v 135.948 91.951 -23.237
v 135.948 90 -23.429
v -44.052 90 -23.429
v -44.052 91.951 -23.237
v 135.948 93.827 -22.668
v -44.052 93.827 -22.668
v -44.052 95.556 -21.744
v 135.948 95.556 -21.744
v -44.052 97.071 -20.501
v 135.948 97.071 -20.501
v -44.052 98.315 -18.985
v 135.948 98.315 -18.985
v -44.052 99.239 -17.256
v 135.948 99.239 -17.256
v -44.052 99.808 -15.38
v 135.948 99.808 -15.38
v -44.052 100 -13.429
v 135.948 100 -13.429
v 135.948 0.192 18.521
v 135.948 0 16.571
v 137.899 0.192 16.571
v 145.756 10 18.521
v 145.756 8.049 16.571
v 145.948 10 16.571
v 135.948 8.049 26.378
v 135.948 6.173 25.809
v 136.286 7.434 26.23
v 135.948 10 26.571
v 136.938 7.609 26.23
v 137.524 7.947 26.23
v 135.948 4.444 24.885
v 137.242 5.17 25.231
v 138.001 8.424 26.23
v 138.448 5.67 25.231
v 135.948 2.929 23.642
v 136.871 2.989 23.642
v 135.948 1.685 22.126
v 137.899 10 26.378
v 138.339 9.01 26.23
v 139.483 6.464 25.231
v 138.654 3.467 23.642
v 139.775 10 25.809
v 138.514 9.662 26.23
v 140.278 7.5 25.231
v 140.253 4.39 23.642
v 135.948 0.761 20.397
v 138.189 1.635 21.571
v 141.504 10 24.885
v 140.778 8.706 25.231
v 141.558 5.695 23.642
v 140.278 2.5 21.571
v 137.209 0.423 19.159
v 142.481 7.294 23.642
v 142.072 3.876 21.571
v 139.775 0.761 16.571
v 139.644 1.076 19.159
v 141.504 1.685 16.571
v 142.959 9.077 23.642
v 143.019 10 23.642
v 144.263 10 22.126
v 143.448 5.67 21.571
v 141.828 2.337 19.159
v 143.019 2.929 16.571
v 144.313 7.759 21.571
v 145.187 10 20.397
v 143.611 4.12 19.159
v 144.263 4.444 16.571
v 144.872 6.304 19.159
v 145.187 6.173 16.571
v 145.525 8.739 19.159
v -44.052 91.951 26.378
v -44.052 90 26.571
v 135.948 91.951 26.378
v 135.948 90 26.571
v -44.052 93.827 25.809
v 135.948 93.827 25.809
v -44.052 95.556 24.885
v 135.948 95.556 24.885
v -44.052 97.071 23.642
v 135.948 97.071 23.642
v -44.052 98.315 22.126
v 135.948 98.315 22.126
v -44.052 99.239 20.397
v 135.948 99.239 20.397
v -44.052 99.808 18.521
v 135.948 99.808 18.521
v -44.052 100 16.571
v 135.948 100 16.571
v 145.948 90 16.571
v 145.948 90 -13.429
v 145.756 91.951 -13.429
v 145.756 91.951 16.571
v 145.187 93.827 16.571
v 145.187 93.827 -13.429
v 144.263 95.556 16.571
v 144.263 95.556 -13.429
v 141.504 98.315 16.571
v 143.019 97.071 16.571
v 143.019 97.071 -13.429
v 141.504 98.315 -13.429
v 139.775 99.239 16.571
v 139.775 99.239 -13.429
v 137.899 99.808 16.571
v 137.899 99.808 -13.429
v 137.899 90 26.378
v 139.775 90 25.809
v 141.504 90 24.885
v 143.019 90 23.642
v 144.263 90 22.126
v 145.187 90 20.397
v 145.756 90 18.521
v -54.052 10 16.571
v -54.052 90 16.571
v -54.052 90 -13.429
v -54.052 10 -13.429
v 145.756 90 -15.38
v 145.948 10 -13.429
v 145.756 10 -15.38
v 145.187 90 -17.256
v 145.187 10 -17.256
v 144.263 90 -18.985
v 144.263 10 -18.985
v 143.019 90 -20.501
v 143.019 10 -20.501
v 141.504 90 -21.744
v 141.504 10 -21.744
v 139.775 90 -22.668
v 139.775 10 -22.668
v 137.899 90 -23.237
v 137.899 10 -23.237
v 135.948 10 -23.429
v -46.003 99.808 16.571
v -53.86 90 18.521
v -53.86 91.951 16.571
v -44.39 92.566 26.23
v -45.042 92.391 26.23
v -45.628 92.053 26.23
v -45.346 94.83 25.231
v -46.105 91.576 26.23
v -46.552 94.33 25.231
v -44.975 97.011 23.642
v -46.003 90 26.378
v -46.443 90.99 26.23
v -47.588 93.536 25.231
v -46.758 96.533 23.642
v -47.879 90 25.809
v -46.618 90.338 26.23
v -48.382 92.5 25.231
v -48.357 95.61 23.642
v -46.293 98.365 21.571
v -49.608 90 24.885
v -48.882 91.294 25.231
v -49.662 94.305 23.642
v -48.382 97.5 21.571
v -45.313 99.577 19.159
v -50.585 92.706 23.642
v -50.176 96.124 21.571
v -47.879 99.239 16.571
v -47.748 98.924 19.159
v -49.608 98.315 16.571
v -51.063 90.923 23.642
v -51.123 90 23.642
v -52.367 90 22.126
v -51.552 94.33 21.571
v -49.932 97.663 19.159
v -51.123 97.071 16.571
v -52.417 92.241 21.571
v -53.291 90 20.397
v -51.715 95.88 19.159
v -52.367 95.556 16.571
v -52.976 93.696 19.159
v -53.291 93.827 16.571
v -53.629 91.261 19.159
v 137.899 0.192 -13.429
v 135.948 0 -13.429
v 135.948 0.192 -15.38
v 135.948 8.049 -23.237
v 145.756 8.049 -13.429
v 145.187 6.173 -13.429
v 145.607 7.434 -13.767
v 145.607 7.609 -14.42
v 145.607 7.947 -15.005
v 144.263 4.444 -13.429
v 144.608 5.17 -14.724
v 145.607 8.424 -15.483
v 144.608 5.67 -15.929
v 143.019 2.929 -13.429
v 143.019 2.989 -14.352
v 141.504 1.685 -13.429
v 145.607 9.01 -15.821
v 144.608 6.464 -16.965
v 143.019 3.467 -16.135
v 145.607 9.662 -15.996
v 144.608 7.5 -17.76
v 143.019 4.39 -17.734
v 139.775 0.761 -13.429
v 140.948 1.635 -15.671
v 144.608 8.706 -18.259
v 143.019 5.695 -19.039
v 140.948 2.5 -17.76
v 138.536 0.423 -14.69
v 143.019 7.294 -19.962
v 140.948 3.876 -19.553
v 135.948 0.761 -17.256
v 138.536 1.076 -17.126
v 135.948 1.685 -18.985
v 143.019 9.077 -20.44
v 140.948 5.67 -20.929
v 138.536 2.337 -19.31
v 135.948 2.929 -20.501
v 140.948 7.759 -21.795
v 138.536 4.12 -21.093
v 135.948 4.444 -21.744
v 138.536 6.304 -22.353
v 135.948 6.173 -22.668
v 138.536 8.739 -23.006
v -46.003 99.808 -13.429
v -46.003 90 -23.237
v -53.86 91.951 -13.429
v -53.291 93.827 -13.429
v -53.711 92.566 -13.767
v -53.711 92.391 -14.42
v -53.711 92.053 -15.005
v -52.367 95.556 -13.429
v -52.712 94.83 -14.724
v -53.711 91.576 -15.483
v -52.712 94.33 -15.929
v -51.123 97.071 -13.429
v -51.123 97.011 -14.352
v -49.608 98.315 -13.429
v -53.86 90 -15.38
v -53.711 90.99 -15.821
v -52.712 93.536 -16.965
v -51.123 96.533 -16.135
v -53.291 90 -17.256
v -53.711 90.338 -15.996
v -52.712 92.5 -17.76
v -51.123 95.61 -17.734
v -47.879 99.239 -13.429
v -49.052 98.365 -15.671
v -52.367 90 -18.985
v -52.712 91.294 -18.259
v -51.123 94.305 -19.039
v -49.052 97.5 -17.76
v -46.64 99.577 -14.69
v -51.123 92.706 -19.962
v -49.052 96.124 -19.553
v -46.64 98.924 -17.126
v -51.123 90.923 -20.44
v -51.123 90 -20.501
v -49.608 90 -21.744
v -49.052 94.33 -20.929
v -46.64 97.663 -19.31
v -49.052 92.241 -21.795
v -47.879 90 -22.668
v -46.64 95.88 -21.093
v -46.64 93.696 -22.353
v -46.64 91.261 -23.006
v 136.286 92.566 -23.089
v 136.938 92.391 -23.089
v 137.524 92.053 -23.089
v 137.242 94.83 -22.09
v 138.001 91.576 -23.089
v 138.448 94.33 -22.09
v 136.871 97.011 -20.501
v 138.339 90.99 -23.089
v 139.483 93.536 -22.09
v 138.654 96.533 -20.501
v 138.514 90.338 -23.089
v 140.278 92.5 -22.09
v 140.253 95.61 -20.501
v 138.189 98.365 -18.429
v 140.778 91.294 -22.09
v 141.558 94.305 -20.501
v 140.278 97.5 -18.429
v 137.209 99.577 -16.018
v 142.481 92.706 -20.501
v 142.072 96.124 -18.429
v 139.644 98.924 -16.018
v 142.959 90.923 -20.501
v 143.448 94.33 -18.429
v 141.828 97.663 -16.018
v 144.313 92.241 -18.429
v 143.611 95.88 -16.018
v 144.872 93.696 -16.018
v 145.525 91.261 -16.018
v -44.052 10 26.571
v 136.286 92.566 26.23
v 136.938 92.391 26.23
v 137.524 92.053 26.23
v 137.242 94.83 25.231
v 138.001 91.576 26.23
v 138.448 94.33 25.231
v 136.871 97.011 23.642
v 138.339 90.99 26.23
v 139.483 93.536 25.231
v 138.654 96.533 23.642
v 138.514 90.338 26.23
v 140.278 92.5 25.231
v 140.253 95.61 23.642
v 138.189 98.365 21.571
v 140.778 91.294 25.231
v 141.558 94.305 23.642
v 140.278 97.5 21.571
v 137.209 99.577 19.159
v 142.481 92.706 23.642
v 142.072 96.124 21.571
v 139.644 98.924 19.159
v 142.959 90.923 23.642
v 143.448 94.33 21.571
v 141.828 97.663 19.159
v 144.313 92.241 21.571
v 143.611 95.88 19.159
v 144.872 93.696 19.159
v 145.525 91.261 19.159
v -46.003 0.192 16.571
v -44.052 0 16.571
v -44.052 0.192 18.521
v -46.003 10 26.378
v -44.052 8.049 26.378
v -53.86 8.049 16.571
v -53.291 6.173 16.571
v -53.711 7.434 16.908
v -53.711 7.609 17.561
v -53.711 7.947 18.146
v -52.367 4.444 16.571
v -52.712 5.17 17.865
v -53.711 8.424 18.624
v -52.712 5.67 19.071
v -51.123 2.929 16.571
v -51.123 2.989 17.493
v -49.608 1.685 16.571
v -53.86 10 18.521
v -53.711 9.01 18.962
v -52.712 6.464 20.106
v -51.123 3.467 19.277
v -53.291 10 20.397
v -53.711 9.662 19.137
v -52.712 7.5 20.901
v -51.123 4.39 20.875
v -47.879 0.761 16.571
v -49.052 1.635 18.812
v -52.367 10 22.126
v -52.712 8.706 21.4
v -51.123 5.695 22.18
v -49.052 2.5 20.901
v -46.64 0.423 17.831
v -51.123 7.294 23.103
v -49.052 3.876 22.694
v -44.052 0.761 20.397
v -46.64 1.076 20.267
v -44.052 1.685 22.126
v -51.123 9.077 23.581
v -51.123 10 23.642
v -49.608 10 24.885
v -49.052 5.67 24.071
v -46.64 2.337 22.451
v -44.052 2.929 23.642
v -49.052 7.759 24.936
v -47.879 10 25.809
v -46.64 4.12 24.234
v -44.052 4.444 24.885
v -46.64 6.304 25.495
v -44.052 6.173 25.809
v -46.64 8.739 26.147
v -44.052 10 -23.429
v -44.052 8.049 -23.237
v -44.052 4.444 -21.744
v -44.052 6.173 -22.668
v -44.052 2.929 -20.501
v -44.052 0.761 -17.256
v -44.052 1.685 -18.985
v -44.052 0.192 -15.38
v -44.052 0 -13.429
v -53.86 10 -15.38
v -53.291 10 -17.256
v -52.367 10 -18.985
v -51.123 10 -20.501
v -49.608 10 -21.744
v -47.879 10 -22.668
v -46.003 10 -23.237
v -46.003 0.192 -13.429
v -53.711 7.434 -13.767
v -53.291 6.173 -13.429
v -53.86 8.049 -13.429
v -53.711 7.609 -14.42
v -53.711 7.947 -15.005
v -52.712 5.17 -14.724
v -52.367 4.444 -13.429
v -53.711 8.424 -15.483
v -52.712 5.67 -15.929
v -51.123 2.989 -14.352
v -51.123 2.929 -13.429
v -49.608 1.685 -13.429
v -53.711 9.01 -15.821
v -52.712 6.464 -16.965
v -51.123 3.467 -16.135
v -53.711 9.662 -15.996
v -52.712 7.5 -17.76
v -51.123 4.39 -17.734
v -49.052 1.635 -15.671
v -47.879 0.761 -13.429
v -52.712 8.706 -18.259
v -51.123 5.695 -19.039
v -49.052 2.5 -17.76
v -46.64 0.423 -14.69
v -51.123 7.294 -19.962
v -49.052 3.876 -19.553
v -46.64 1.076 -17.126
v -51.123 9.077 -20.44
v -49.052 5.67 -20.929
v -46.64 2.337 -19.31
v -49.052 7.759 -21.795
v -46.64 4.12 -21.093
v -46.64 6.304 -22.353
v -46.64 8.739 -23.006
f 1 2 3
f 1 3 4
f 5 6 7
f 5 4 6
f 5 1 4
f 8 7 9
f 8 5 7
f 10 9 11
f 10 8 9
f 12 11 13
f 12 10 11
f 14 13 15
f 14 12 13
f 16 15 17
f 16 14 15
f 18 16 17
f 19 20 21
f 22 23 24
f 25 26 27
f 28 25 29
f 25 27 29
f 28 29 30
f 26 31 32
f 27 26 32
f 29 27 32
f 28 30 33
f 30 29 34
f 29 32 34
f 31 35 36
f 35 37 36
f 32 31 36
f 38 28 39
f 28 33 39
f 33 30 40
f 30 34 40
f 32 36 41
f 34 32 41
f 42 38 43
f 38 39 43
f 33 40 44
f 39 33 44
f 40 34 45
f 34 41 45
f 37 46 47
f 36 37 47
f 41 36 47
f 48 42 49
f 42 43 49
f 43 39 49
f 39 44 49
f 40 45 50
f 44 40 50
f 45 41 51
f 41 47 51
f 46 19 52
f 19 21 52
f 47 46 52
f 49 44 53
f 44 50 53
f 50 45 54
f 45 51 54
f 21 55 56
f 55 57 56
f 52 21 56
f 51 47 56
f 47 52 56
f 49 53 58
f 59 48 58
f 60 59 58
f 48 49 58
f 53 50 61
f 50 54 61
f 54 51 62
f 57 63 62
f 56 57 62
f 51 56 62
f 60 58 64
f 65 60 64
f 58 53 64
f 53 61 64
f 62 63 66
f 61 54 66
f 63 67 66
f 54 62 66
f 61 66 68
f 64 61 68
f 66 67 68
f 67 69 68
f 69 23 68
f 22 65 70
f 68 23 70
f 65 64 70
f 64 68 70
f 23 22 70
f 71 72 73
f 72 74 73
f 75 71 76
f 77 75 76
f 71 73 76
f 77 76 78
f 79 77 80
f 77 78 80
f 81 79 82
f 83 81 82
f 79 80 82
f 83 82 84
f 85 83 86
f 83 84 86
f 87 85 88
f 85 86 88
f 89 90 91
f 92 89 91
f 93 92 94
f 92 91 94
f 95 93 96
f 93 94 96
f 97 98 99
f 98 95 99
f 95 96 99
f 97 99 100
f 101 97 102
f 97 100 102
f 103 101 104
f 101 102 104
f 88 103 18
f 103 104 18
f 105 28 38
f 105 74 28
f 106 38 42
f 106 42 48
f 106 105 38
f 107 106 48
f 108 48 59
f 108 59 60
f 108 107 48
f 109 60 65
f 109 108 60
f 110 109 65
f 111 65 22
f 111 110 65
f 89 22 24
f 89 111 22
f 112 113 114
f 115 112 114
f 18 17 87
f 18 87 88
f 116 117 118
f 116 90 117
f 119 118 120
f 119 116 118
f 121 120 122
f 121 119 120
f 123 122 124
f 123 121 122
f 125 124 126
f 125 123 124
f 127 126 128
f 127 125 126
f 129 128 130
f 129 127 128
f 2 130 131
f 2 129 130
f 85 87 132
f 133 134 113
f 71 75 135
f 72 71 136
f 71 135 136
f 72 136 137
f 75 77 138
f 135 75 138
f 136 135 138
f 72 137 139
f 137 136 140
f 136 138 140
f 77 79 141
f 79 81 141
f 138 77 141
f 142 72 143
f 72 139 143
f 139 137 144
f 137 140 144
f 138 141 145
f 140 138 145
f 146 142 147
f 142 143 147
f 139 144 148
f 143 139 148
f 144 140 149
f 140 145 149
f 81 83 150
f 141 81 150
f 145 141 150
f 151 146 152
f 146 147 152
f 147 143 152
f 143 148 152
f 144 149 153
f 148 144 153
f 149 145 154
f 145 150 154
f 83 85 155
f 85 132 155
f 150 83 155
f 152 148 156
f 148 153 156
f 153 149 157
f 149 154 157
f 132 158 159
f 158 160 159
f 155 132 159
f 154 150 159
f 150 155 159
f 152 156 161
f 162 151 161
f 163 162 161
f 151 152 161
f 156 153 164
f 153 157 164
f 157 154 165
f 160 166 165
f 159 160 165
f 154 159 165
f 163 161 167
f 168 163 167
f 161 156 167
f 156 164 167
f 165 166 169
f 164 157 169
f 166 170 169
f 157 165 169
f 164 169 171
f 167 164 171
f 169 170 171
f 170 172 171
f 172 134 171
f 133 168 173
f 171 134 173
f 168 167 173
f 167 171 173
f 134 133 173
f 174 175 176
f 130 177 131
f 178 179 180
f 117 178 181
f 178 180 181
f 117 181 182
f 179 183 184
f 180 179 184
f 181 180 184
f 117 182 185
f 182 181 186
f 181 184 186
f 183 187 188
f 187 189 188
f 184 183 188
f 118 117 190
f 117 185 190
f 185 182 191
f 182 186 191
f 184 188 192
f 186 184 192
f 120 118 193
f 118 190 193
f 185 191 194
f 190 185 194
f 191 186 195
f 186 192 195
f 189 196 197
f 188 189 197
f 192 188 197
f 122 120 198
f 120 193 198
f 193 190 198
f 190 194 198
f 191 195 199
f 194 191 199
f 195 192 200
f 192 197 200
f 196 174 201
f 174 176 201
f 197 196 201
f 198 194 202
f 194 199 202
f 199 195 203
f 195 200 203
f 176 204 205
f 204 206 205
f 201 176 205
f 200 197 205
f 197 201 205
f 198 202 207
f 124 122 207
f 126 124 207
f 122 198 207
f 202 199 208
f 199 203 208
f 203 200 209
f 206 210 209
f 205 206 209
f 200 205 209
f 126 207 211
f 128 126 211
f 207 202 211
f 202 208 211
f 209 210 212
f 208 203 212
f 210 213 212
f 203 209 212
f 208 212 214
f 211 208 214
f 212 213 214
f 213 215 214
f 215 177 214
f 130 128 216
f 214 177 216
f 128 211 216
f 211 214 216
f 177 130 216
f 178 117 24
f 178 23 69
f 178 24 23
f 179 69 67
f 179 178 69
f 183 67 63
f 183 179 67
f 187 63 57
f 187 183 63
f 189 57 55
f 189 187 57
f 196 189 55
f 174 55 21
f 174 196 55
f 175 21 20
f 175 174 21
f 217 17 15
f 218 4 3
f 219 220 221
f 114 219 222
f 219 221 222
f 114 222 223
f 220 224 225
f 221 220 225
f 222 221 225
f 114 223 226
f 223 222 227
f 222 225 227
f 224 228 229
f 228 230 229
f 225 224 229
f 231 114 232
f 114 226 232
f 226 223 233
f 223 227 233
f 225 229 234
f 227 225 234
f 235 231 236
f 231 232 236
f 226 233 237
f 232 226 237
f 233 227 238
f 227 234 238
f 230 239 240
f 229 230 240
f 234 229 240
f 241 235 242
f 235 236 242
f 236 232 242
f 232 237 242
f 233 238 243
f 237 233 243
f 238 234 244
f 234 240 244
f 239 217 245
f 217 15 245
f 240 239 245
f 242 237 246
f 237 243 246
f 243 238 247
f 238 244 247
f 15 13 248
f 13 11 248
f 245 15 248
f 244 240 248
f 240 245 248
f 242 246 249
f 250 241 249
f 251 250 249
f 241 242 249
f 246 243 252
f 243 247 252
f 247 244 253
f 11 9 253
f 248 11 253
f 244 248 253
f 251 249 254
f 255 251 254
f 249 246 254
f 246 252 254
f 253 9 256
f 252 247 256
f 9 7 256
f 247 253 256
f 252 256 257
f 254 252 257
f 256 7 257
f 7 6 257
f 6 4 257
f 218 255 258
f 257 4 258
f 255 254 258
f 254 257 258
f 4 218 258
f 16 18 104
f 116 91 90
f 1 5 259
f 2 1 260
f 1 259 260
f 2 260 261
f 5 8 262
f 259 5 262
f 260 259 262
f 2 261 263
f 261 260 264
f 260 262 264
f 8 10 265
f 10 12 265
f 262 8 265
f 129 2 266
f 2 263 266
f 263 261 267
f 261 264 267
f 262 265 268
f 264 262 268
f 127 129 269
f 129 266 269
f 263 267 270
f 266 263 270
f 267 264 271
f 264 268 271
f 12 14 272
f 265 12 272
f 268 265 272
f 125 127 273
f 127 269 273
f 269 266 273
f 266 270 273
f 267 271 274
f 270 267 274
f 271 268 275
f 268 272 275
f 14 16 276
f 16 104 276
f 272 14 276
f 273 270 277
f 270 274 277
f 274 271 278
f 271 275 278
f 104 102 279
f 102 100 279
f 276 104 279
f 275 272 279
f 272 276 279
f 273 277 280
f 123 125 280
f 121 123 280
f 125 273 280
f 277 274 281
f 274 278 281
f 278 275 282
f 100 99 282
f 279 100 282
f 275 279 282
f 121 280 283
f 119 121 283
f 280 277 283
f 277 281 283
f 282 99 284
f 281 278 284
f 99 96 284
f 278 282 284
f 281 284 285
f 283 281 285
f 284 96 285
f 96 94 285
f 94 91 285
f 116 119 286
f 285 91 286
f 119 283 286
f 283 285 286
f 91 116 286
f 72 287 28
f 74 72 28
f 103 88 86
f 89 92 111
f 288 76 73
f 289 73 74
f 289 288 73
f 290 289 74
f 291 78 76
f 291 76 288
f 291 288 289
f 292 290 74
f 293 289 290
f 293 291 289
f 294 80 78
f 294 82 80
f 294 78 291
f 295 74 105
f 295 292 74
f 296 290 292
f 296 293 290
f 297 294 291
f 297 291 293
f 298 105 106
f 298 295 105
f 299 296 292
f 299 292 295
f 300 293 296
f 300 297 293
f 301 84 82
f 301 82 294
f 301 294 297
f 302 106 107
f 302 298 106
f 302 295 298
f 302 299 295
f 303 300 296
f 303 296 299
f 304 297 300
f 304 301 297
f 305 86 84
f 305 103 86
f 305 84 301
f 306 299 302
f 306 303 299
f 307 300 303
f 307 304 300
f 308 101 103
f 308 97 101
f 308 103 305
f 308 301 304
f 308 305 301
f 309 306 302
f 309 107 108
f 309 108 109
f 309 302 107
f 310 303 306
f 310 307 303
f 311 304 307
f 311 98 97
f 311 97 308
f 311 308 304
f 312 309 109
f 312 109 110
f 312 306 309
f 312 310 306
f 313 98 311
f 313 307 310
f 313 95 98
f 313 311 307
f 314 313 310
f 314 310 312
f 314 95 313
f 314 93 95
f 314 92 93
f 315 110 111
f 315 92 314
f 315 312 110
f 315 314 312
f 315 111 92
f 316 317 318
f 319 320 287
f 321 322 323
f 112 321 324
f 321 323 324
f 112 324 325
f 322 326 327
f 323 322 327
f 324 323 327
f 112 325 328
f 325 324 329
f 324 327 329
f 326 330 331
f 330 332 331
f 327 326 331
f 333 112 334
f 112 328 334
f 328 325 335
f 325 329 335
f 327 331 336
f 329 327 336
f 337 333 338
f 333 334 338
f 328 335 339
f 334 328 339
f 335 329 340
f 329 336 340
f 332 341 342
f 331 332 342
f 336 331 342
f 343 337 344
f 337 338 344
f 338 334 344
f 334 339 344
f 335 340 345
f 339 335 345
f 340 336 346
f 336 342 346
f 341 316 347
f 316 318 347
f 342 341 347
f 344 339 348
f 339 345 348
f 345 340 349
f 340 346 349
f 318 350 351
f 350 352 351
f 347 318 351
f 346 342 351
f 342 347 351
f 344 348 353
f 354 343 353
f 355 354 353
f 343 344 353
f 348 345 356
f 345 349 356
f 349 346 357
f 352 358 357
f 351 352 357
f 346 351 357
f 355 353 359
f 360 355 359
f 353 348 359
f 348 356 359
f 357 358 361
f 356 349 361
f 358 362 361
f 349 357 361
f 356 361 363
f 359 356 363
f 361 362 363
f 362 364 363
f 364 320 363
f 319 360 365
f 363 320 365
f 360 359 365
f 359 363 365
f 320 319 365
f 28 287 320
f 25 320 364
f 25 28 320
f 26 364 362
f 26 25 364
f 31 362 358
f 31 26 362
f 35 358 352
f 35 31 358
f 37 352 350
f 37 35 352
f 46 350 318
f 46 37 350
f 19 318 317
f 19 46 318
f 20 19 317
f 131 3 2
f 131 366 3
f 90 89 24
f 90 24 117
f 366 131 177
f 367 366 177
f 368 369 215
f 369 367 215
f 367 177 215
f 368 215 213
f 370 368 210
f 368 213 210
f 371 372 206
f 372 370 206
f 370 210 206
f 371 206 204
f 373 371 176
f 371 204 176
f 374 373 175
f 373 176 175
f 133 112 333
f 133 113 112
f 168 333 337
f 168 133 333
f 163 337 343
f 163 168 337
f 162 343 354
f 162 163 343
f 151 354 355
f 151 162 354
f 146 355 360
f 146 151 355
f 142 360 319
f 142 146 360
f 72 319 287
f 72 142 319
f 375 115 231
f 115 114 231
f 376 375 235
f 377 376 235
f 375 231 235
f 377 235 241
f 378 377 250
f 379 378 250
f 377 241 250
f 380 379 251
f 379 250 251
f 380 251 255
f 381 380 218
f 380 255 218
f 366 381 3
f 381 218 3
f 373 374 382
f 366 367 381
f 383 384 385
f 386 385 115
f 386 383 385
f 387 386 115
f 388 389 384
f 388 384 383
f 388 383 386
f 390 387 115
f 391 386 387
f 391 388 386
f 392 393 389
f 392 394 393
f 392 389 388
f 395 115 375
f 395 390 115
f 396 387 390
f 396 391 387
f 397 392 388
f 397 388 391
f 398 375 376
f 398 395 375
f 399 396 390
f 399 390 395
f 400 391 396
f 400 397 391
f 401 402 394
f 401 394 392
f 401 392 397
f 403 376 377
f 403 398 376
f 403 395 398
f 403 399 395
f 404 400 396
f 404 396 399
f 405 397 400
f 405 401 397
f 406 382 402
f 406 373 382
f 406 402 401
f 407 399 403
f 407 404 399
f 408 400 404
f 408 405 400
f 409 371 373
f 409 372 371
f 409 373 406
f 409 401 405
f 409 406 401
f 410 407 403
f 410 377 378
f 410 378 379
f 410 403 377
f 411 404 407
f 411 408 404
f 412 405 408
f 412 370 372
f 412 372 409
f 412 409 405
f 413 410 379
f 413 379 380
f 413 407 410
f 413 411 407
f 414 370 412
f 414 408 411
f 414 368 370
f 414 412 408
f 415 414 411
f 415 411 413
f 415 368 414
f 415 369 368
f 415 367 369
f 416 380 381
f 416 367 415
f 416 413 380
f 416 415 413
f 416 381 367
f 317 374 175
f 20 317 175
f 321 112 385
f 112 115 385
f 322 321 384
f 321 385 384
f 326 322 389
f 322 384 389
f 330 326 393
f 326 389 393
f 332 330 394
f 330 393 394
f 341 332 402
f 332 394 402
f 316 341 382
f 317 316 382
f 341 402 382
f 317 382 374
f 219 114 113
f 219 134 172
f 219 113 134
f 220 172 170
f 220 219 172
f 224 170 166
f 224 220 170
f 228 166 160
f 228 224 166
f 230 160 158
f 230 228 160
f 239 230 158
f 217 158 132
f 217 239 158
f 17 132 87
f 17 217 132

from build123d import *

# Parameters (mm, degrees)
ESBO_O1_W                = 200
ESBO_O1_H                = 50
RESSALTO_EXTRUS_O1_DEPTH = 100
FILETE9_R                = 10


with BuildPart() as part:
    # Esboço1 → Ressalto-extrusão1 (new body)
    with BuildSketch(Plane(origin=(0, 0, 0), x_dir=(1, 0, 0), z_dir=(0, 1, 0))):
        with Locations((45.947958133, -1.570526198)):
            Rectangle(ESBO_O1_W, ESBO_O1_H)
    extrude(amount=RESSALTO_EXTRUS_O1_DEPTH)

    # Filete9
    filete9_edges = [part.edges().sort_by_distance(p)[0] for p in [
        (145.947958133, 100, 1.570526198),
        (45.947958133, 100, -23.429473802),
        (-54.052041867, 100, 1.570526198),
        (45.947958133, 0, -23.429473802),
        (145.947958133, 0, 1.570526198),
        (45.947958133, 0, 26.570526198),
        (-54.052041867, 0, 1.570526198),
        (45.947958133, 100, 26.570526198),
        (-54.052041867, 50, -23.429473802),
        (145.947958133, 50, -23.429473802),
        (145.947958133, 50, 26.570526198),
        (-54.052041867, 50, 26.570526198),
    ]]
    fillet(filete9_edges, radius=FILETE9_R)


solid = part.part
